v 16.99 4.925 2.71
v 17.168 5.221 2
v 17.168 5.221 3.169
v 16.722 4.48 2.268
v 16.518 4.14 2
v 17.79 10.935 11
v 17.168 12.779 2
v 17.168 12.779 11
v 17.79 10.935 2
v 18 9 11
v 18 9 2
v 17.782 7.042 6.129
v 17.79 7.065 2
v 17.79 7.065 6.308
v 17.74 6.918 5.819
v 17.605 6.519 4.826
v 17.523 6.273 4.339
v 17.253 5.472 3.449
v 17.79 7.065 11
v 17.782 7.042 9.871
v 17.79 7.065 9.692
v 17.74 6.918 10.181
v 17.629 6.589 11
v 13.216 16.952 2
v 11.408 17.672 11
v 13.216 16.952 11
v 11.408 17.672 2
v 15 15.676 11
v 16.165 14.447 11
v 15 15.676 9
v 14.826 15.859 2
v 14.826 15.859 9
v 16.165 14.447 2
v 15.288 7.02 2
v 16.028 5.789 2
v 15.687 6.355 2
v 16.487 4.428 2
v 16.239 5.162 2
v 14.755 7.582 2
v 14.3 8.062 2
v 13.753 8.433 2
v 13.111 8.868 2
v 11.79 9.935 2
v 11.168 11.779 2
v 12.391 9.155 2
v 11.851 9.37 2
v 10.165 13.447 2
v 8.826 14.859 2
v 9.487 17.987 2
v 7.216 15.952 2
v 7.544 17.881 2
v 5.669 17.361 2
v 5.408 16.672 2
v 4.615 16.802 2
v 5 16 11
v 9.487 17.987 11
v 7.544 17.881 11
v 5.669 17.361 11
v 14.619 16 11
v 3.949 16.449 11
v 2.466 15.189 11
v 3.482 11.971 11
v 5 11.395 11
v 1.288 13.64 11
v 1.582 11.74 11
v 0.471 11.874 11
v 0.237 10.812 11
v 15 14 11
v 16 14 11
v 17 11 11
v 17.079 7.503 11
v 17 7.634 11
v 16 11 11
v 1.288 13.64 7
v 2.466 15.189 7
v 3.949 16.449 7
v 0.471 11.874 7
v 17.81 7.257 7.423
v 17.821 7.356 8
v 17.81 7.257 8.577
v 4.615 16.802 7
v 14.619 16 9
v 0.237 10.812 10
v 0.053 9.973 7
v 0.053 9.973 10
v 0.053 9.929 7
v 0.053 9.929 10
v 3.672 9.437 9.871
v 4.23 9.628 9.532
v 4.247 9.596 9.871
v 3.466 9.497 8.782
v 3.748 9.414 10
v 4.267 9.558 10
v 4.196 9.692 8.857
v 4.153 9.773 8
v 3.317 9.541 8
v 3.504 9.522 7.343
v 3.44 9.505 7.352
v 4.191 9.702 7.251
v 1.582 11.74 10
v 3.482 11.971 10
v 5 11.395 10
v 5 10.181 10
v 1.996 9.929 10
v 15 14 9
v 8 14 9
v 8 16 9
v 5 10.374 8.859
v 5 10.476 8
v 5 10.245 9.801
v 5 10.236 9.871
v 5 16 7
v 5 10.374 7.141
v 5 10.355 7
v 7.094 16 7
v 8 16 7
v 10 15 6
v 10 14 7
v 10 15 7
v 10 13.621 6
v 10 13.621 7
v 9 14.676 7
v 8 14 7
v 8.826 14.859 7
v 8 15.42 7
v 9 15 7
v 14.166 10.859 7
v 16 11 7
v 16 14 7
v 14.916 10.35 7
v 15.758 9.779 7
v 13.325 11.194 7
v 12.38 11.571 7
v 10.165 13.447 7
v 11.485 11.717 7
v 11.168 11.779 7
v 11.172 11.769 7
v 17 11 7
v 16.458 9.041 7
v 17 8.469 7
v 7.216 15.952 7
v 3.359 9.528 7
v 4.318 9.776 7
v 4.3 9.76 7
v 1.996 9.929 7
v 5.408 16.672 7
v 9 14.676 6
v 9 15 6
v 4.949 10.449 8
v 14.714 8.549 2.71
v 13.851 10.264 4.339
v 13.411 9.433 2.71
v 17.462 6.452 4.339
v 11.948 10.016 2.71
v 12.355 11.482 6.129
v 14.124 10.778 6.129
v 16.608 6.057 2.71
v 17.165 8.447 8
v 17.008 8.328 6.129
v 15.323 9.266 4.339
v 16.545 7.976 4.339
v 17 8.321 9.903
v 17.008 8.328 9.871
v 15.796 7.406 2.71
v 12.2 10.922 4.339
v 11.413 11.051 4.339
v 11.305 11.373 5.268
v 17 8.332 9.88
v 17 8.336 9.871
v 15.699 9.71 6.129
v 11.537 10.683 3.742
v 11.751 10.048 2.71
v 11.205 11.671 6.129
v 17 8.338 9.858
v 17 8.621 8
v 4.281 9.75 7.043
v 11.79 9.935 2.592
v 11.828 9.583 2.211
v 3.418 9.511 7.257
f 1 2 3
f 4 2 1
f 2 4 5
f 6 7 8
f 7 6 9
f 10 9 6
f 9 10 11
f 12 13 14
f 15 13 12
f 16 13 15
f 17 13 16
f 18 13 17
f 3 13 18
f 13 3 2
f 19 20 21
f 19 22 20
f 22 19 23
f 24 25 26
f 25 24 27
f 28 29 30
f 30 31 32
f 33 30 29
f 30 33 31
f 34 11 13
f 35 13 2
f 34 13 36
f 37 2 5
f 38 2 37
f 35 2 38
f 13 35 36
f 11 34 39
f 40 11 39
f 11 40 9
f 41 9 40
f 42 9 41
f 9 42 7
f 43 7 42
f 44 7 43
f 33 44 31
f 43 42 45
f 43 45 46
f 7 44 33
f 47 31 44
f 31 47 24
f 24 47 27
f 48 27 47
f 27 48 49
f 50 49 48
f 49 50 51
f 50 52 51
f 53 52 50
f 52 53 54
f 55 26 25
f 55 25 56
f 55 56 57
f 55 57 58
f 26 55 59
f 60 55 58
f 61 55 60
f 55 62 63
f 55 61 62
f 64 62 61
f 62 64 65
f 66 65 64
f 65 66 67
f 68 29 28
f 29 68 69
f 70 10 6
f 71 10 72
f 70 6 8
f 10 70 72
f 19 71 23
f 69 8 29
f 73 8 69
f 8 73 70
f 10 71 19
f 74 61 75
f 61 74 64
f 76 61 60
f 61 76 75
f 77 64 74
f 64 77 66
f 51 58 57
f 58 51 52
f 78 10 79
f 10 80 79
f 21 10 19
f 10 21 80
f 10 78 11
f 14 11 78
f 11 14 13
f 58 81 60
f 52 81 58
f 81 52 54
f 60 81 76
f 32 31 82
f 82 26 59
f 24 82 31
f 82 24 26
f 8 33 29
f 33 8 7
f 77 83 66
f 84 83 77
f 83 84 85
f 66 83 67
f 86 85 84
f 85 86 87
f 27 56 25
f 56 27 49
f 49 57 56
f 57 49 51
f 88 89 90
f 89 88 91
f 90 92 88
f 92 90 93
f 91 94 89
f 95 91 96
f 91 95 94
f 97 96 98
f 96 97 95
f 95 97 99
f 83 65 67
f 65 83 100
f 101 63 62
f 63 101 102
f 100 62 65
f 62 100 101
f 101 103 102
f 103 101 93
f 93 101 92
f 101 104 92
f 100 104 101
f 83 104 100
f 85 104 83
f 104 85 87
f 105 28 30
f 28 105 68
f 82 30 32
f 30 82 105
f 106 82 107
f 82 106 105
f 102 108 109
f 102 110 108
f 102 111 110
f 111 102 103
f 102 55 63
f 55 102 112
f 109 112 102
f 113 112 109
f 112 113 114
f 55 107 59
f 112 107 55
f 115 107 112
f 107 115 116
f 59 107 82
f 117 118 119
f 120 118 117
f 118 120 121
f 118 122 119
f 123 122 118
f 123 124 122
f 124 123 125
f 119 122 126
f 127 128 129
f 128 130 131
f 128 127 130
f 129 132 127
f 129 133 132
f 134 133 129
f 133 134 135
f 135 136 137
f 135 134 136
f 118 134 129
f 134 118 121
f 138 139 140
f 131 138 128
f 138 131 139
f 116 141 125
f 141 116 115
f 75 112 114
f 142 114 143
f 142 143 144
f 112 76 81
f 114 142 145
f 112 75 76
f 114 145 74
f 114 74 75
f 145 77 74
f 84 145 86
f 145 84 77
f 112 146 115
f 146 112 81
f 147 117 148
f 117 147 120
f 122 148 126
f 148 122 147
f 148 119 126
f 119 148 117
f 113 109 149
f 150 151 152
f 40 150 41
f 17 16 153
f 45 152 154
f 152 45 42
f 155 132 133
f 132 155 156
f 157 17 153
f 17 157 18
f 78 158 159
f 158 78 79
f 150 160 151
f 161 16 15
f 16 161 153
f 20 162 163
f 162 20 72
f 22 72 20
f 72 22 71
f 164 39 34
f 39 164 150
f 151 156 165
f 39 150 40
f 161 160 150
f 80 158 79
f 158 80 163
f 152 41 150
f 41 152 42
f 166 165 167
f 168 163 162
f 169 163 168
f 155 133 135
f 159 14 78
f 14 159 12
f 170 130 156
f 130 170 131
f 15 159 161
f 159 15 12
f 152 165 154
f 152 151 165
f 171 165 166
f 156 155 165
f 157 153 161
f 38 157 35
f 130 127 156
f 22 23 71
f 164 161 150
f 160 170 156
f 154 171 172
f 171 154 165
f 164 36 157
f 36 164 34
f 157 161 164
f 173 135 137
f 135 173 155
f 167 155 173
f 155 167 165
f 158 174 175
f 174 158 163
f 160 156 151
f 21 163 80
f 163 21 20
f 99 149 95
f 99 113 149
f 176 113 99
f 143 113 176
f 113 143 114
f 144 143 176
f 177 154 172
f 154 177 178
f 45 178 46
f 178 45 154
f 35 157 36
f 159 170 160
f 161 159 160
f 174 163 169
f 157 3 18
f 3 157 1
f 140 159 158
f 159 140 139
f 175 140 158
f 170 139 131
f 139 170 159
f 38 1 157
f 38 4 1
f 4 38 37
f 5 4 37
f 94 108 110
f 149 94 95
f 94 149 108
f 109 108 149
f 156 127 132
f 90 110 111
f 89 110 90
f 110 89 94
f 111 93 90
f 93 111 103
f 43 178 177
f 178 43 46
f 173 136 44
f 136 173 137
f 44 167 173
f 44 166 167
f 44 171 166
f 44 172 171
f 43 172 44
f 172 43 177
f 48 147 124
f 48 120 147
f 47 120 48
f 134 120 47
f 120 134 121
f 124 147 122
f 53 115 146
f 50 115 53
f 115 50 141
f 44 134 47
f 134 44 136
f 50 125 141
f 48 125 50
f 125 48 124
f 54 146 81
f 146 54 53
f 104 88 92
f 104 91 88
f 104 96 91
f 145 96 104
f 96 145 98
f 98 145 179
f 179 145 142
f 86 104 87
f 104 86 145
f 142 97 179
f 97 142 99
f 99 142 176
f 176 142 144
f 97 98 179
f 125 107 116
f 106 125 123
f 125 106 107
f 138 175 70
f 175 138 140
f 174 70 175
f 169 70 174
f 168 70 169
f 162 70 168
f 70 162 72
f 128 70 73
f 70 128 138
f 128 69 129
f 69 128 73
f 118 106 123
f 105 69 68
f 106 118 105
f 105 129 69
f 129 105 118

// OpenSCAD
//created with rubyscad 1.0.7

difference() {
   translate(v = [9, 9, 2]) {
      cylinder(r = 9, h = 9); 
   }
   translate(v = [6, 1, 8]) {
      sphere(r = 9); 
   }
   translate(v = [5, 2, 5]) {
      cylinder(r = 7, h = 1); 
   }
   translate(v = [3, 8, 10]) {
      cylinder(r = 4, h = 8); 
   }
   translate(v = [6, 7, 0]) {
      sphere(r = 6); 
   }
   translate(v = [3, 6, 10]) {
      cylinder(r = 2, h = 6); 
   }
   translate(v = [1, 10, 3]) {
      cube(size = [8, 4, 2]); 
   }
   translate(v = [1, 2, 8]) {
      cube(size = [6, 2, 2]); 
   }
   translate(v = [5, 8, 9]) {
      cube(size = [10, 8, 7]); 
   }
   translate(v = [9, 4, 7]) {
      sphere(r = 1); 
   }
   translate(v = [2, 4, 0]) {
      sphere(r = 2); 
   }
   translate(v = [9, 8, 6]) {
      cube(size = [1, 7, 1]); 
   }
   translate(v = [1, 4, 4]) {
      sphere(r = 5); 
   }
   translate(v = [3, 5, 1]) {
      cube(size = [2, 1, 7]); 
   }
   translate(v = [9, 2, 8]) {
      cylinder(r = 3, h = 1); 
   }
   translate(v = [6, 2, 9]) {
      sphere(r = 1); 
   }
   translate(v = [10, 3, 8]) {
      sphere(r = 9); 
   }
   translate(v = [7, 6, 8]) {
      sphere(r = 4); 
   }
   translate(v = [6, 5, 2]) {
      sphere(r = 2); 
   }
   translate(v = [3, 8, 0]) {
      cylinder(r = 9, h = 7); 
   }
   translate(v = [1, 3, 5]) {
      cylinder(r = 7, h = 9); 
   }
   translate(v = [10, 7, 5]) {
      cylinder(r = 0, h = 2); 
   }
   translate(v = [9, 8, 9]) {
      cube(size = [6, 7, 4]); 
   }
   translate(v = [6, 2, 7]) {
      sphere(r = 8); 
   }
   translate(v = [5, 8, 7]) {
      cube(size = [3, 8, 7]); 
   }
   translate(v = [7, 10, 1]) {
      cube(size = [1, 4, 3]); 
   }
   translate(v = [8, 6, 7]) {
      cube(size = [9, 5, 4]); 
   }
   translate(v = [6, 9, 7]) {
      cube(size = [10, 5, 7]); 
   }
   translate(v = [3, 2, 3]) {
      cylinder(r = 5, h = 7); 
   }
   translate(v = [4, 0, 5]) {
      cylinder(r = 4, h = 6); 
   }
}
